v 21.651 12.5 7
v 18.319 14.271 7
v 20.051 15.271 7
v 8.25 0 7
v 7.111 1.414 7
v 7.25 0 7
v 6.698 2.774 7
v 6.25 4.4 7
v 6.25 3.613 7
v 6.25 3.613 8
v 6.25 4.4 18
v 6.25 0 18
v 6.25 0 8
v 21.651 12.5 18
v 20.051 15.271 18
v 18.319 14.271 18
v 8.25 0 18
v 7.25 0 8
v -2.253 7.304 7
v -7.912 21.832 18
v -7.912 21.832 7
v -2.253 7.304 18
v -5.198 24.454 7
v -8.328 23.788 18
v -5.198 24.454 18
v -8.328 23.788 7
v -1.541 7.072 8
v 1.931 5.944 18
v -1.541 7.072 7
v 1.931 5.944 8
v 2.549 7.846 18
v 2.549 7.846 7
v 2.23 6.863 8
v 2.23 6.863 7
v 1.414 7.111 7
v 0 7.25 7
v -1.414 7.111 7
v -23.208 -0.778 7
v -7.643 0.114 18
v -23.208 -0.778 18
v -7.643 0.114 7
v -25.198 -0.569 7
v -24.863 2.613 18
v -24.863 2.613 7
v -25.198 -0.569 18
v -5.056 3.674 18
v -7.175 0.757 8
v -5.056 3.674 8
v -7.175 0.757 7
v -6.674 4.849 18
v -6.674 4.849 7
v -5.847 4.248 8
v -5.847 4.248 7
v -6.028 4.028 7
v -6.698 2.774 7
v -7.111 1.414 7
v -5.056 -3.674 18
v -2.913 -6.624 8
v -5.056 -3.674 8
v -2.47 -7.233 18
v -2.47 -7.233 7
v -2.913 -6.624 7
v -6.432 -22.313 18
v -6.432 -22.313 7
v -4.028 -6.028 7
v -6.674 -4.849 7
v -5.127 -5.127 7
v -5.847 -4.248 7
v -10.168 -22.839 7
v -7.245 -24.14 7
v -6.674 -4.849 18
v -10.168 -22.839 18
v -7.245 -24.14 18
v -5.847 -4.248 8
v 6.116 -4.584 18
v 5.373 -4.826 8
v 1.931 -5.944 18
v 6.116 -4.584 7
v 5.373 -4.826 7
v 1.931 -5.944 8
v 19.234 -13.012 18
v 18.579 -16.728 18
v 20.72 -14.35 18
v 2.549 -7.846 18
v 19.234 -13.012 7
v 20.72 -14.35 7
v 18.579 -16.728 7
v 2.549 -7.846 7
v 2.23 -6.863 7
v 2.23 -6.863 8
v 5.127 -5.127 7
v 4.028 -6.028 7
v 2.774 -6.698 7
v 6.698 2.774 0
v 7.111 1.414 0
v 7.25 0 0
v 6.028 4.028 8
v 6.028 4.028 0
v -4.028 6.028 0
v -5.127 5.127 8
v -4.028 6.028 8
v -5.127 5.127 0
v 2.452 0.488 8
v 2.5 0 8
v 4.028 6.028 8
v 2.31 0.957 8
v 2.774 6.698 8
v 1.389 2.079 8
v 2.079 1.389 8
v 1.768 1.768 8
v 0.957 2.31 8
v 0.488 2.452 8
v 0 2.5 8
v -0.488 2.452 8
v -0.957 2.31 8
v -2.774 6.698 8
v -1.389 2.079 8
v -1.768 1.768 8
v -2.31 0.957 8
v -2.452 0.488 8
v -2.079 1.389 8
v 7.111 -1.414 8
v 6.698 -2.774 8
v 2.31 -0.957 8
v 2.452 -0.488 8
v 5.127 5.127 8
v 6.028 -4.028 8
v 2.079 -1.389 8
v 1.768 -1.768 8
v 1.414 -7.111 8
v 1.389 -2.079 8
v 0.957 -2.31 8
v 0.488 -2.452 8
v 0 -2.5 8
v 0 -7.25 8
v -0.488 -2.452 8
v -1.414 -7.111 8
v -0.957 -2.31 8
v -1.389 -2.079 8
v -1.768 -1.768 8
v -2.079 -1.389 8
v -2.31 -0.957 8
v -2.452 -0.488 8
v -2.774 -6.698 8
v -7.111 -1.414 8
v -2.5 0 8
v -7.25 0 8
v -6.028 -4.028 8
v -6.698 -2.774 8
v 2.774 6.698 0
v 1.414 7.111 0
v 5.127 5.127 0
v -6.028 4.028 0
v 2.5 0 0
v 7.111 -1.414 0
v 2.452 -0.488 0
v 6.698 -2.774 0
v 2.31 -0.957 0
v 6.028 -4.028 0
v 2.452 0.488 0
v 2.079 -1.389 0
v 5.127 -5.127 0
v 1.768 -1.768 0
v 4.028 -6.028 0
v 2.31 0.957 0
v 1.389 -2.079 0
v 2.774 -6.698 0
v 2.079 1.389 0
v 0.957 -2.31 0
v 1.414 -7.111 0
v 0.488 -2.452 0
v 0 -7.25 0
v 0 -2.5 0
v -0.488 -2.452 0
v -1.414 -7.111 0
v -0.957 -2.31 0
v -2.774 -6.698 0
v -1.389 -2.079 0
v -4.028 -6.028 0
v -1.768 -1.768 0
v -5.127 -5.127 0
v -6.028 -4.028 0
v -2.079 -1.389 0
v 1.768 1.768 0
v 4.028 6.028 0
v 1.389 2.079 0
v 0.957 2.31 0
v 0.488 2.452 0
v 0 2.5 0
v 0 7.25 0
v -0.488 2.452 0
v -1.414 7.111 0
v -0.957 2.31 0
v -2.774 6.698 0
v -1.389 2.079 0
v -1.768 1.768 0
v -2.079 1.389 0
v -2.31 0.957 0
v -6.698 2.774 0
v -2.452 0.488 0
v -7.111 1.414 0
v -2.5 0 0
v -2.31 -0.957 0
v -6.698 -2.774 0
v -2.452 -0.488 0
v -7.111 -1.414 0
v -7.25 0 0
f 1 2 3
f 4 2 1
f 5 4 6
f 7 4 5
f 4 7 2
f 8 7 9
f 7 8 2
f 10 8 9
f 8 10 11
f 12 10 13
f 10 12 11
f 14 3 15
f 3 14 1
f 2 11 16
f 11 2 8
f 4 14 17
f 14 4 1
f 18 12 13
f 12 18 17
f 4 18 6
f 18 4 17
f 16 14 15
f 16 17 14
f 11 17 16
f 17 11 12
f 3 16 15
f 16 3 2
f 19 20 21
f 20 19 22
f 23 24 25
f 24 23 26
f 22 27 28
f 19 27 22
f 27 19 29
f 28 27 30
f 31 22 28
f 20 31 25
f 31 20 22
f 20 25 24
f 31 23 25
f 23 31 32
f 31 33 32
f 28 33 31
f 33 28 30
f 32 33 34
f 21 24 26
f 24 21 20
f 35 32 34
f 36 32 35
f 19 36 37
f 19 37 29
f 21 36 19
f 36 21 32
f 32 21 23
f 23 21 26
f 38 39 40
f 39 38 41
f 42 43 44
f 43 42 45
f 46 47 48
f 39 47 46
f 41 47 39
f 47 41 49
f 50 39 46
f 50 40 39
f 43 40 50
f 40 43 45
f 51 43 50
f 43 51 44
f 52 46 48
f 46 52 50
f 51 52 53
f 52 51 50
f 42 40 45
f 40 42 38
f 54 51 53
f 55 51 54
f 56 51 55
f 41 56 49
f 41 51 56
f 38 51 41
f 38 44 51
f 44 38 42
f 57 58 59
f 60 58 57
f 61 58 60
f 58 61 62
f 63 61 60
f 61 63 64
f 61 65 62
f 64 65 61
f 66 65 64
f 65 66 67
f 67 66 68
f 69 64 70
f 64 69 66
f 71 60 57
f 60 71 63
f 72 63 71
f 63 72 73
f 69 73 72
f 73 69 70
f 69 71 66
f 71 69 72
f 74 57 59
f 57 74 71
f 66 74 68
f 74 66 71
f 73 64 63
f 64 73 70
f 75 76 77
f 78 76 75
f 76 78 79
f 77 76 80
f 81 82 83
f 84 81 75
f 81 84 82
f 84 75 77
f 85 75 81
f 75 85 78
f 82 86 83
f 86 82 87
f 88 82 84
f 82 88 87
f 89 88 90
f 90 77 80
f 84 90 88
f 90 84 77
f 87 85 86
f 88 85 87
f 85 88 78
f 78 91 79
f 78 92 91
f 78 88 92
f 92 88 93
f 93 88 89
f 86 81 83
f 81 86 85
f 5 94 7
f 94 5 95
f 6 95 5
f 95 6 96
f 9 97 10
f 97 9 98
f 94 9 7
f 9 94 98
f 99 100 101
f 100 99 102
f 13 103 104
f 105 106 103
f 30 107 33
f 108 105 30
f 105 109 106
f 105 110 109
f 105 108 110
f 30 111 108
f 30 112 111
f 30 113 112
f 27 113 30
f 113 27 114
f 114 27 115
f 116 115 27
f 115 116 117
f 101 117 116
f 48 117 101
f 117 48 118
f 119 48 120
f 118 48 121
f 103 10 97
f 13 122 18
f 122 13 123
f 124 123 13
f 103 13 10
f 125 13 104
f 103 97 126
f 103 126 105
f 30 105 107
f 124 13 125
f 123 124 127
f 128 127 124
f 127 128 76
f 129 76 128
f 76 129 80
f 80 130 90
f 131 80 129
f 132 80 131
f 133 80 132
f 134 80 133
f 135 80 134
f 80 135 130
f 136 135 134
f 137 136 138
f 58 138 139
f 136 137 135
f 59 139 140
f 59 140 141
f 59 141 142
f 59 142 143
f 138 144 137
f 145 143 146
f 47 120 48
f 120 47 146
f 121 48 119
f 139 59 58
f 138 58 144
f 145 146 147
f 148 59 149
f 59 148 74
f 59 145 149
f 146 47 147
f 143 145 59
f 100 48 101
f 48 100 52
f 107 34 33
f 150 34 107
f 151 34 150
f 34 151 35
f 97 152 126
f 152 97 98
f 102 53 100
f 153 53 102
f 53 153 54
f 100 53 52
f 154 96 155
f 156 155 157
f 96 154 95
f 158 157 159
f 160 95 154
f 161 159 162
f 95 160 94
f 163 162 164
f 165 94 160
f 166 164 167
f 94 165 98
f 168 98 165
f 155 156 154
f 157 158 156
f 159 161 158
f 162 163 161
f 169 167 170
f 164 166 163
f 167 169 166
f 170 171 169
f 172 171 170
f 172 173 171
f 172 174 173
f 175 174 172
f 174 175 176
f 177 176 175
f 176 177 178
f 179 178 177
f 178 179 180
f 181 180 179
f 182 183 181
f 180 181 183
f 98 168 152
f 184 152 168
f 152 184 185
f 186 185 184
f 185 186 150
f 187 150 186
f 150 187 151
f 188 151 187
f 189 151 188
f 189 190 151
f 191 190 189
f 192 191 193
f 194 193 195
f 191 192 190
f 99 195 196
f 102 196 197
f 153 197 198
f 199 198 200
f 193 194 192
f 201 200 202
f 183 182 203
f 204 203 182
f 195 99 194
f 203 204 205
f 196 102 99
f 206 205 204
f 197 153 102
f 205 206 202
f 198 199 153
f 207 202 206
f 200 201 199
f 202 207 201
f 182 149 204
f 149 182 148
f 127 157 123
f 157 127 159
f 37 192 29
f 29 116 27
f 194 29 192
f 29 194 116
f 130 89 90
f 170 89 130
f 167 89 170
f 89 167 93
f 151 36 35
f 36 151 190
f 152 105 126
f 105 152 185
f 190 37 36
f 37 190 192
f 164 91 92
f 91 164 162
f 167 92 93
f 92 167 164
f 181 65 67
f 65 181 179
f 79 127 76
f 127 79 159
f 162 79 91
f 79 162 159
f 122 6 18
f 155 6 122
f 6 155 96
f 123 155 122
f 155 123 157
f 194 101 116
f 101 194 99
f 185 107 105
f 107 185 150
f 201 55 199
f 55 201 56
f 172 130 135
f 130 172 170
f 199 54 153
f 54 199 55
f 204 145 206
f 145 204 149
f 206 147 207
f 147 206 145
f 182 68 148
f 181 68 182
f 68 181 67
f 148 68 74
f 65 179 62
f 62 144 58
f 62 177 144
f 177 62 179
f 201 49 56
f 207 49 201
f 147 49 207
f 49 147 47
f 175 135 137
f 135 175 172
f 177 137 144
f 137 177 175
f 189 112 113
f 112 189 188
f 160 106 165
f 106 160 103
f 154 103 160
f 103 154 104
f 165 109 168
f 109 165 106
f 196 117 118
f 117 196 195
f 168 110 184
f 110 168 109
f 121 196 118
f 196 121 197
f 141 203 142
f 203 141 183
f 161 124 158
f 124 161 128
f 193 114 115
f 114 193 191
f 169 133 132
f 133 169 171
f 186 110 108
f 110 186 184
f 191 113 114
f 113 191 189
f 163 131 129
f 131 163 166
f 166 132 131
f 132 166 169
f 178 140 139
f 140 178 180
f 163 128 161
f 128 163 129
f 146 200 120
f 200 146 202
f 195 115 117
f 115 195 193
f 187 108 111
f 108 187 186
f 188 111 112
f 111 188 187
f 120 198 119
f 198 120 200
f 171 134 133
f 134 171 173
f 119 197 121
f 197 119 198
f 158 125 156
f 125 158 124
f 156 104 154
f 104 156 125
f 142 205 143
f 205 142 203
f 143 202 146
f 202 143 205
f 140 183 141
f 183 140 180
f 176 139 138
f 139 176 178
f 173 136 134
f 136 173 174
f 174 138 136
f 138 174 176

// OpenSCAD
$fn = 32;

// ----------------------------------------------------------------------
// Impeller: 50 mm, 5 blades, 18 mm tall
// ----------------------------------------------------------------------

// --- parameters (mm) ---
boss_d = 14.5;            // hub diameter
boss_h = 8;               // hub height
rotor_d = 50;             // outer diameter over the blades
vane_count = 5;           // number of blades
blade_t = 2;              // blade thickness
blade_h = 10;             // blade height
blade_in_r = 6.25;        // blade root radius
blade_out_r = 23;         // blade tip radius
sweep = 30;               // blade sweep, degrees
bore_d = 5;               // shaft bore

module hub() {
  cylinder(h = boss_h, d = boss_d);
}

module blade() {
  /* blade swept between two boxes: hull of the root and the tip section */
  hull() {
    translate([blade_in_r, 0, boss_h - 1])
      cube([blade_t, blade_t * 2.2, blade_h + 1], center = false);
    rotate([0, 0, sweep])
      translate([blade_out_r, 0, boss_h - 1])
        cube([blade_t, blade_t * 1.6, blade_h + 1], center = false);
  }
}

module blades() {
  for (i = [0 : vane_count - 1])
    rotate([0, 0, i * 360 / vane_count]) blade();
}

difference() {
  union() {
    hub();
    blades();
  }
  translate([0, 0, -1]) cylinder(h = boss_h + blade_h + 0 + 3, d = bore_d);
}
